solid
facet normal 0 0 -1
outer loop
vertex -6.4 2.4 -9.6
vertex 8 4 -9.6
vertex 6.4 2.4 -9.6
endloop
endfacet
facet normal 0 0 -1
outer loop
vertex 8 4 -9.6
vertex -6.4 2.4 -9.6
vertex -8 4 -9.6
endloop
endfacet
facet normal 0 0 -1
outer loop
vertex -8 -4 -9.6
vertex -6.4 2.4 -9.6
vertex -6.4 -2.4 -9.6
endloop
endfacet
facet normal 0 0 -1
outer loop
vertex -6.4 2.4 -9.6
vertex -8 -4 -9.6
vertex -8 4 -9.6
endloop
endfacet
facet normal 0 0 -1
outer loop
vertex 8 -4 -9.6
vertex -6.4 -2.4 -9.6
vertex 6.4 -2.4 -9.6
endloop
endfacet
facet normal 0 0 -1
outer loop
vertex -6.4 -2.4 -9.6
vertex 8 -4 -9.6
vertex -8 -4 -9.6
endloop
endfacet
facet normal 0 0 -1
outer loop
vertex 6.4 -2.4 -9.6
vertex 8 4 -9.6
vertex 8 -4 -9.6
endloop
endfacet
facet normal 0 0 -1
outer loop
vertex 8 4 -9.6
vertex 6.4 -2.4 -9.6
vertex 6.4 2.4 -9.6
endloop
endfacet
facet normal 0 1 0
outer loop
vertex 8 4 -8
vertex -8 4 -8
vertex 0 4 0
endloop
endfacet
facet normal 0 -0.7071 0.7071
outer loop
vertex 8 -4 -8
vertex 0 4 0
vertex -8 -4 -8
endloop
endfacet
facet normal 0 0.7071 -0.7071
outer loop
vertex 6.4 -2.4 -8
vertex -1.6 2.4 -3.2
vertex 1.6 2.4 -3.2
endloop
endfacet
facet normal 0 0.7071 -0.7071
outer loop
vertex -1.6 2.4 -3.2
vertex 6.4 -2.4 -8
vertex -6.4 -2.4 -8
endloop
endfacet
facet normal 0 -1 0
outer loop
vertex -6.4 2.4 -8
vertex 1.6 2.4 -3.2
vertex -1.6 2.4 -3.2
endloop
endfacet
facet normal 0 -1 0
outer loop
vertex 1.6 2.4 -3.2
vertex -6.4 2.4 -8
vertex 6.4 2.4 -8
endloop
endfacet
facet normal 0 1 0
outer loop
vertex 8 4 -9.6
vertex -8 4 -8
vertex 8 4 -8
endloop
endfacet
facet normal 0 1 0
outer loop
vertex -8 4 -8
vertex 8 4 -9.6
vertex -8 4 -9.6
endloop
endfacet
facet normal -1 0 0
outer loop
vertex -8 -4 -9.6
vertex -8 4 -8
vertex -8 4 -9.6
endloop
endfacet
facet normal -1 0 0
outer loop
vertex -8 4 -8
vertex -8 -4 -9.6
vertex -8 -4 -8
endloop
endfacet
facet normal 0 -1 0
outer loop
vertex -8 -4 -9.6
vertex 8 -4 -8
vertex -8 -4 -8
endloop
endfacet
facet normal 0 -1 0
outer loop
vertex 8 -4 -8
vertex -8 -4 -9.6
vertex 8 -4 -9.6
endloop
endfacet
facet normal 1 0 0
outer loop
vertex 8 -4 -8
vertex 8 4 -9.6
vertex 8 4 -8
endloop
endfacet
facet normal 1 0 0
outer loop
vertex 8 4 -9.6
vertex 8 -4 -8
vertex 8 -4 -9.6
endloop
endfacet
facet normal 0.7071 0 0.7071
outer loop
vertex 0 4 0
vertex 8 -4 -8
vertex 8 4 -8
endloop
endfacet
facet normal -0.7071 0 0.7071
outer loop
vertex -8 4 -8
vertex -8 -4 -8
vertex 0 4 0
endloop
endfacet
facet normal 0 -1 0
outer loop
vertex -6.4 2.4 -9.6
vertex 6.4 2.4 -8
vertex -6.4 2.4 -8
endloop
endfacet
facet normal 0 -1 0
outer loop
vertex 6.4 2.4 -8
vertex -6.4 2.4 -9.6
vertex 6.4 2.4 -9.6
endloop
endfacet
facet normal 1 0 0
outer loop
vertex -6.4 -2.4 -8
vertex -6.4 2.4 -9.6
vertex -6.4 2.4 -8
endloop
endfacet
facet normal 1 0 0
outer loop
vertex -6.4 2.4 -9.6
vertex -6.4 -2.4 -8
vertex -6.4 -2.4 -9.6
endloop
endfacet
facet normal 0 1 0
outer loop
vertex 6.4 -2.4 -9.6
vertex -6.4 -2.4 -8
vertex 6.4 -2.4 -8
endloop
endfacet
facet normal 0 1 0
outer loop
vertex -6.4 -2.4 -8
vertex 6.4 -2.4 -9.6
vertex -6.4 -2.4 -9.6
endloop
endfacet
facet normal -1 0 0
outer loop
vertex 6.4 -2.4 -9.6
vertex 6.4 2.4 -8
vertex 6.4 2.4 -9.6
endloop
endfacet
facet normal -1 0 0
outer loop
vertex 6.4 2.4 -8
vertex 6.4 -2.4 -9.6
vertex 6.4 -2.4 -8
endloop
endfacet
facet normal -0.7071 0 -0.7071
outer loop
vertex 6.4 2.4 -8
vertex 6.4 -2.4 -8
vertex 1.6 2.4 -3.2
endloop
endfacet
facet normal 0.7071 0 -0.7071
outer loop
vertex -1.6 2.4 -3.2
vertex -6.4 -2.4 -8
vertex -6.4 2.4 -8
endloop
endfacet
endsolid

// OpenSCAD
// file: ../p/triangle.scad
use <../lib.scad>
function ldraw_lib__triangle() = [
// 0 Triangle
// 0 Name: triangle.dat
// 0 Author: Steffen [Steffen]
// 0 !LDRAW_ORG Primitive UPDATE 2013-01
// 0 !LICENSE Licensed under CC BY 4.0 : see CAreadme.txt
// 
// 0 BFC CERTIFY CCW
  [0,"BFC","CERTIFY"],
  [0,"BFC","CCW"],
// 
// 0 !HISTORY 2013-07-21 [PTadmin] Official Update 2013-01
// 
// 
// 3 16 0 0 0 1 0 0 0 0 1
  [3,16,0,0,0,1,0,0,0,0,1],
// 2 24 0 0 0 1 0 0
  [2,24,0,0,0,1,0,0],
// 2 24 1 0 0 0 0 1
  [2,24,1,0,0,0,0,1],
// 2 24 0 0 1 0 0 0
  [2,24,0,0,1,0,0,0],
];
module ldraw_lib__triangle(step=0, col=false, unit=2/5, alt=false, line=0.2, solid=!$preview)
    makepoly(ldraw_lib__triangle(), step=step, col=col, unit=unit, alt=alt, line=line, solid=solid);
ldraw_lib__triangle(line=0.2);
// file: ../p/box4o4a.scad
use <../lib.scad>
function ldraw_lib__box4o4a() = [
// 0 Box with 4 Faces (2 Parallel Pairs) without Bottom Edges
// 0 Name: box4o4a.dat
// 0 Author: Donald Sutter [technog]
// 0 !LDRAW_ORG Primitive UPDATE 2012-01
// 0 !LICENSE Licensed under CC BY 4.0 : see CAreadme.txt
// 
// 0 BFC CERTIFY CCW
  [0,"BFC","CERTIFY"],
  [0,"BFC","CCW"],
// 
// 0 !HISTORY 2003-08-01 [PTadmin] Official Update 2003-02
// 0 !HISTORY 2007-06-24 [PTadmin] Header formatted for Contributor Agreement
// 0 !HISTORY 2008-07-01 [PTadmin] Official Update 2008-01
// 0 !HISTORY 2012-02-16 [Philo] Changed to CCW
// 0 !HISTORY 2012-03-30 [PTadmin] Official Update 2012-01
// 
// 
// 2 24 1 0 1 -1 0 1
  [2,24,1,0,1,-1,0,1],
// 2 24 -1 0 1 -1 0 -1
  [2,24,-1,0,1,-1,0,-1],
// 2 24 -1 0 -1 1 0 -1
  [2,24,-1,0,-1,1,0,-1],
// 2 24 1 0 -1 1 0 1
  [2,24,1,0,-1,1,0,1],
// 2 24 1 0 1 1 1 1
  [2,24,1,0,1,1,1,1],
// 2 24 -1 0 1 -1 1 1
  [2,24,-1,0,1,-1,1,1],
// 2 24 1 0 -1 1 1 -1
  [2,24,1,0,-1,1,1,-1],
// 2 24 -1 0 -1 -1 1 -1
  [2,24,-1,0,-1,-1,1,-1],
// 4 16 -1 1 1 -1 0 1 1 0 1 1 1 1
  [4,16,-1,1,1,-1,0,1,1,0,1,1,1,1],
// 4 16 -1 1 -1 -1 0 -1 -1 0 1 -1 1 1
  [4,16,-1,1,-1,-1,0,-1,-1,0,1,-1,1,1],
// 4 16 1 1 -1 1 0 -1 -1 0 -1 -1 1 -1
  [4,16,1,1,-1,1,0,-1,-1,0,-1,-1,1,-1],
// 4 16 1 1 1 1 0 1 1 0 -1 1 1 -1
  [4,16,1,1,1,1,0,1,1,0,-1,1,1,-1],
];
module ldraw_lib__box4o4a(step=0, col=false, unit=2/5, alt=false, line=0.2, solid=!$preview)
    makepoly(ldraw_lib__box4o4a(), step=step, col=col, unit=unit, alt=alt, line=line, solid=solid);
ldraw_lib__box4o4a(line=0.2);
// main file
use <../lib.scad>
use <../p/box4o4a.scad>
use <../p/triangle.scad>
function ldraw_lib__3048a() = [
// 0 Slope Brick 45  1 x  2 Triple without Bottom Stud
// 0 Name: 3048a.dat
// 0 Author: Philippe Hurbain [Philo]
// 0 !LDRAW_ORG Part UPDATE 2015-02
// 0 !LICENSE Licensed under CC BY 4.0 : see CAreadme.txt
// 
// 0 BFC CERTIFY CCW
  [0,"BFC","CERTIFY"],
  [0,"BFC","CCW"],
// 
// 0 !HISTORY 2015-10-20 [MMR1988] Used more primitives
// 0 !HISTORY 2015-12-30 [PTadmin] Official Update 2015-02
// 
// 
// 4 16 20 24 10 16 24 6 -16 24 6 -20 24 10
  [4,16,20,24,10,16,24,6,-16,24,6,-20,24,10],
// 4 16 -20 24 10 -16 24 6 -16 24 -6 -20 24 -10
  [4,16,-20,24,10,-16,24,6,-16,24,-6,-20,24,-10],
// 4 16 -20 24 -10 -16 24 -6 16 24 -6 20 24 -10
  [4,16,-20,24,-10,-16,24,-6,16,24,-6,20,24,-10],
// 4 16 20 24 -10 16 24 -6 16 24 6 20 24 10
  [4,16,20,24,-10,16,24,-6,16,24,6,20,24,10],
// 
// 3 16 20 20 10 -20 20 10 0 0 10
  [3,16,20,20,10,-20,20,10,0,0,10],
// 3 16 20 20 -10 0 0 10 -20 20 -10
  [3,16,20,20,-10,0,0,10,-20,20,-10],
// 4 16 16 20 -6 -16 20 -6 -4 8 6 4 8 6
  [4,16,16,20,-6,-16,20,-6,-4,8,6,4,8,6],
// 4 16 16 20 6 4 8 6 -4 8 6 -16 20 6
  [4,16,16,20,6,4,8,6,-4,8,6,-16,20,6],
// 
// 1 16 0 24 0 20 0 0 0 -4 0 0 0 10 box4o4a.dat
  [1,16,0,24,0,20,0,0,0,-4,0,0,0,10, ldraw_lib__box4o4a()],
// 1 16 20 20 10 0 -1 -20 0 0 -20 -20 0 0 triangle.dat
  [1,16,20,20,10,0,-1,-20,0,0,-20,-20,0,0, ldraw_lib__triangle()],
// 1 16 -20 20 10 0 1 20 0 0 -20 -20 0 0 triangle.dat
  [1,16,-20,20,10,0,1,20,0,0,-20,-20,0,0, ldraw_lib__triangle()],
// 
// 0 BFC INVERTNEXT
  [0,"BFC","INVERTNEXT"],
// 1 16 0 24 0 16 0 0 0 -4 0 0 0 6 box4o4a.dat
  [1,16,0,24,0,16,0,0,0,-4,0,0,0,6, ldraw_lib__box4o4a()],
// 1 16 16 20 6 0 1 -12 0 0 -12 -12 0 0 triangle.dat
  [1,16,16,20,6,0,1,-12,0,0,-12,-12,0,0, ldraw_lib__triangle()],
// 1 16 -16 20 6 0 -1 12 0 0 -12 -12 0 0 triangle.dat
  [1,16,-16,20,6,0,-1,12,0,0,-12,-12,0,0, ldraw_lib__triangle()],
// 
// 2 24 16 20 -6 -16 20 -6
  [2,24,16,20,-6,-16,20,-6],
// 2 24 20 20 -10 -20 20 -10
  [2,24,20,20,-10,-20,20,-10],
// 2 24 4 8 6 -4 8 6
  [2,24,4,8,6,-4,8,6],
];
module ldraw_lib__3048a(step=0, col=false, unit=2/5, alt=false, line=0.2, solid=!$preview)
    makepoly(ldraw_lib__3048a(), step=step, col=col, unit=unit, alt=alt, line=line, solid=solid);
ldraw_lib__3048a(line=0.2);
